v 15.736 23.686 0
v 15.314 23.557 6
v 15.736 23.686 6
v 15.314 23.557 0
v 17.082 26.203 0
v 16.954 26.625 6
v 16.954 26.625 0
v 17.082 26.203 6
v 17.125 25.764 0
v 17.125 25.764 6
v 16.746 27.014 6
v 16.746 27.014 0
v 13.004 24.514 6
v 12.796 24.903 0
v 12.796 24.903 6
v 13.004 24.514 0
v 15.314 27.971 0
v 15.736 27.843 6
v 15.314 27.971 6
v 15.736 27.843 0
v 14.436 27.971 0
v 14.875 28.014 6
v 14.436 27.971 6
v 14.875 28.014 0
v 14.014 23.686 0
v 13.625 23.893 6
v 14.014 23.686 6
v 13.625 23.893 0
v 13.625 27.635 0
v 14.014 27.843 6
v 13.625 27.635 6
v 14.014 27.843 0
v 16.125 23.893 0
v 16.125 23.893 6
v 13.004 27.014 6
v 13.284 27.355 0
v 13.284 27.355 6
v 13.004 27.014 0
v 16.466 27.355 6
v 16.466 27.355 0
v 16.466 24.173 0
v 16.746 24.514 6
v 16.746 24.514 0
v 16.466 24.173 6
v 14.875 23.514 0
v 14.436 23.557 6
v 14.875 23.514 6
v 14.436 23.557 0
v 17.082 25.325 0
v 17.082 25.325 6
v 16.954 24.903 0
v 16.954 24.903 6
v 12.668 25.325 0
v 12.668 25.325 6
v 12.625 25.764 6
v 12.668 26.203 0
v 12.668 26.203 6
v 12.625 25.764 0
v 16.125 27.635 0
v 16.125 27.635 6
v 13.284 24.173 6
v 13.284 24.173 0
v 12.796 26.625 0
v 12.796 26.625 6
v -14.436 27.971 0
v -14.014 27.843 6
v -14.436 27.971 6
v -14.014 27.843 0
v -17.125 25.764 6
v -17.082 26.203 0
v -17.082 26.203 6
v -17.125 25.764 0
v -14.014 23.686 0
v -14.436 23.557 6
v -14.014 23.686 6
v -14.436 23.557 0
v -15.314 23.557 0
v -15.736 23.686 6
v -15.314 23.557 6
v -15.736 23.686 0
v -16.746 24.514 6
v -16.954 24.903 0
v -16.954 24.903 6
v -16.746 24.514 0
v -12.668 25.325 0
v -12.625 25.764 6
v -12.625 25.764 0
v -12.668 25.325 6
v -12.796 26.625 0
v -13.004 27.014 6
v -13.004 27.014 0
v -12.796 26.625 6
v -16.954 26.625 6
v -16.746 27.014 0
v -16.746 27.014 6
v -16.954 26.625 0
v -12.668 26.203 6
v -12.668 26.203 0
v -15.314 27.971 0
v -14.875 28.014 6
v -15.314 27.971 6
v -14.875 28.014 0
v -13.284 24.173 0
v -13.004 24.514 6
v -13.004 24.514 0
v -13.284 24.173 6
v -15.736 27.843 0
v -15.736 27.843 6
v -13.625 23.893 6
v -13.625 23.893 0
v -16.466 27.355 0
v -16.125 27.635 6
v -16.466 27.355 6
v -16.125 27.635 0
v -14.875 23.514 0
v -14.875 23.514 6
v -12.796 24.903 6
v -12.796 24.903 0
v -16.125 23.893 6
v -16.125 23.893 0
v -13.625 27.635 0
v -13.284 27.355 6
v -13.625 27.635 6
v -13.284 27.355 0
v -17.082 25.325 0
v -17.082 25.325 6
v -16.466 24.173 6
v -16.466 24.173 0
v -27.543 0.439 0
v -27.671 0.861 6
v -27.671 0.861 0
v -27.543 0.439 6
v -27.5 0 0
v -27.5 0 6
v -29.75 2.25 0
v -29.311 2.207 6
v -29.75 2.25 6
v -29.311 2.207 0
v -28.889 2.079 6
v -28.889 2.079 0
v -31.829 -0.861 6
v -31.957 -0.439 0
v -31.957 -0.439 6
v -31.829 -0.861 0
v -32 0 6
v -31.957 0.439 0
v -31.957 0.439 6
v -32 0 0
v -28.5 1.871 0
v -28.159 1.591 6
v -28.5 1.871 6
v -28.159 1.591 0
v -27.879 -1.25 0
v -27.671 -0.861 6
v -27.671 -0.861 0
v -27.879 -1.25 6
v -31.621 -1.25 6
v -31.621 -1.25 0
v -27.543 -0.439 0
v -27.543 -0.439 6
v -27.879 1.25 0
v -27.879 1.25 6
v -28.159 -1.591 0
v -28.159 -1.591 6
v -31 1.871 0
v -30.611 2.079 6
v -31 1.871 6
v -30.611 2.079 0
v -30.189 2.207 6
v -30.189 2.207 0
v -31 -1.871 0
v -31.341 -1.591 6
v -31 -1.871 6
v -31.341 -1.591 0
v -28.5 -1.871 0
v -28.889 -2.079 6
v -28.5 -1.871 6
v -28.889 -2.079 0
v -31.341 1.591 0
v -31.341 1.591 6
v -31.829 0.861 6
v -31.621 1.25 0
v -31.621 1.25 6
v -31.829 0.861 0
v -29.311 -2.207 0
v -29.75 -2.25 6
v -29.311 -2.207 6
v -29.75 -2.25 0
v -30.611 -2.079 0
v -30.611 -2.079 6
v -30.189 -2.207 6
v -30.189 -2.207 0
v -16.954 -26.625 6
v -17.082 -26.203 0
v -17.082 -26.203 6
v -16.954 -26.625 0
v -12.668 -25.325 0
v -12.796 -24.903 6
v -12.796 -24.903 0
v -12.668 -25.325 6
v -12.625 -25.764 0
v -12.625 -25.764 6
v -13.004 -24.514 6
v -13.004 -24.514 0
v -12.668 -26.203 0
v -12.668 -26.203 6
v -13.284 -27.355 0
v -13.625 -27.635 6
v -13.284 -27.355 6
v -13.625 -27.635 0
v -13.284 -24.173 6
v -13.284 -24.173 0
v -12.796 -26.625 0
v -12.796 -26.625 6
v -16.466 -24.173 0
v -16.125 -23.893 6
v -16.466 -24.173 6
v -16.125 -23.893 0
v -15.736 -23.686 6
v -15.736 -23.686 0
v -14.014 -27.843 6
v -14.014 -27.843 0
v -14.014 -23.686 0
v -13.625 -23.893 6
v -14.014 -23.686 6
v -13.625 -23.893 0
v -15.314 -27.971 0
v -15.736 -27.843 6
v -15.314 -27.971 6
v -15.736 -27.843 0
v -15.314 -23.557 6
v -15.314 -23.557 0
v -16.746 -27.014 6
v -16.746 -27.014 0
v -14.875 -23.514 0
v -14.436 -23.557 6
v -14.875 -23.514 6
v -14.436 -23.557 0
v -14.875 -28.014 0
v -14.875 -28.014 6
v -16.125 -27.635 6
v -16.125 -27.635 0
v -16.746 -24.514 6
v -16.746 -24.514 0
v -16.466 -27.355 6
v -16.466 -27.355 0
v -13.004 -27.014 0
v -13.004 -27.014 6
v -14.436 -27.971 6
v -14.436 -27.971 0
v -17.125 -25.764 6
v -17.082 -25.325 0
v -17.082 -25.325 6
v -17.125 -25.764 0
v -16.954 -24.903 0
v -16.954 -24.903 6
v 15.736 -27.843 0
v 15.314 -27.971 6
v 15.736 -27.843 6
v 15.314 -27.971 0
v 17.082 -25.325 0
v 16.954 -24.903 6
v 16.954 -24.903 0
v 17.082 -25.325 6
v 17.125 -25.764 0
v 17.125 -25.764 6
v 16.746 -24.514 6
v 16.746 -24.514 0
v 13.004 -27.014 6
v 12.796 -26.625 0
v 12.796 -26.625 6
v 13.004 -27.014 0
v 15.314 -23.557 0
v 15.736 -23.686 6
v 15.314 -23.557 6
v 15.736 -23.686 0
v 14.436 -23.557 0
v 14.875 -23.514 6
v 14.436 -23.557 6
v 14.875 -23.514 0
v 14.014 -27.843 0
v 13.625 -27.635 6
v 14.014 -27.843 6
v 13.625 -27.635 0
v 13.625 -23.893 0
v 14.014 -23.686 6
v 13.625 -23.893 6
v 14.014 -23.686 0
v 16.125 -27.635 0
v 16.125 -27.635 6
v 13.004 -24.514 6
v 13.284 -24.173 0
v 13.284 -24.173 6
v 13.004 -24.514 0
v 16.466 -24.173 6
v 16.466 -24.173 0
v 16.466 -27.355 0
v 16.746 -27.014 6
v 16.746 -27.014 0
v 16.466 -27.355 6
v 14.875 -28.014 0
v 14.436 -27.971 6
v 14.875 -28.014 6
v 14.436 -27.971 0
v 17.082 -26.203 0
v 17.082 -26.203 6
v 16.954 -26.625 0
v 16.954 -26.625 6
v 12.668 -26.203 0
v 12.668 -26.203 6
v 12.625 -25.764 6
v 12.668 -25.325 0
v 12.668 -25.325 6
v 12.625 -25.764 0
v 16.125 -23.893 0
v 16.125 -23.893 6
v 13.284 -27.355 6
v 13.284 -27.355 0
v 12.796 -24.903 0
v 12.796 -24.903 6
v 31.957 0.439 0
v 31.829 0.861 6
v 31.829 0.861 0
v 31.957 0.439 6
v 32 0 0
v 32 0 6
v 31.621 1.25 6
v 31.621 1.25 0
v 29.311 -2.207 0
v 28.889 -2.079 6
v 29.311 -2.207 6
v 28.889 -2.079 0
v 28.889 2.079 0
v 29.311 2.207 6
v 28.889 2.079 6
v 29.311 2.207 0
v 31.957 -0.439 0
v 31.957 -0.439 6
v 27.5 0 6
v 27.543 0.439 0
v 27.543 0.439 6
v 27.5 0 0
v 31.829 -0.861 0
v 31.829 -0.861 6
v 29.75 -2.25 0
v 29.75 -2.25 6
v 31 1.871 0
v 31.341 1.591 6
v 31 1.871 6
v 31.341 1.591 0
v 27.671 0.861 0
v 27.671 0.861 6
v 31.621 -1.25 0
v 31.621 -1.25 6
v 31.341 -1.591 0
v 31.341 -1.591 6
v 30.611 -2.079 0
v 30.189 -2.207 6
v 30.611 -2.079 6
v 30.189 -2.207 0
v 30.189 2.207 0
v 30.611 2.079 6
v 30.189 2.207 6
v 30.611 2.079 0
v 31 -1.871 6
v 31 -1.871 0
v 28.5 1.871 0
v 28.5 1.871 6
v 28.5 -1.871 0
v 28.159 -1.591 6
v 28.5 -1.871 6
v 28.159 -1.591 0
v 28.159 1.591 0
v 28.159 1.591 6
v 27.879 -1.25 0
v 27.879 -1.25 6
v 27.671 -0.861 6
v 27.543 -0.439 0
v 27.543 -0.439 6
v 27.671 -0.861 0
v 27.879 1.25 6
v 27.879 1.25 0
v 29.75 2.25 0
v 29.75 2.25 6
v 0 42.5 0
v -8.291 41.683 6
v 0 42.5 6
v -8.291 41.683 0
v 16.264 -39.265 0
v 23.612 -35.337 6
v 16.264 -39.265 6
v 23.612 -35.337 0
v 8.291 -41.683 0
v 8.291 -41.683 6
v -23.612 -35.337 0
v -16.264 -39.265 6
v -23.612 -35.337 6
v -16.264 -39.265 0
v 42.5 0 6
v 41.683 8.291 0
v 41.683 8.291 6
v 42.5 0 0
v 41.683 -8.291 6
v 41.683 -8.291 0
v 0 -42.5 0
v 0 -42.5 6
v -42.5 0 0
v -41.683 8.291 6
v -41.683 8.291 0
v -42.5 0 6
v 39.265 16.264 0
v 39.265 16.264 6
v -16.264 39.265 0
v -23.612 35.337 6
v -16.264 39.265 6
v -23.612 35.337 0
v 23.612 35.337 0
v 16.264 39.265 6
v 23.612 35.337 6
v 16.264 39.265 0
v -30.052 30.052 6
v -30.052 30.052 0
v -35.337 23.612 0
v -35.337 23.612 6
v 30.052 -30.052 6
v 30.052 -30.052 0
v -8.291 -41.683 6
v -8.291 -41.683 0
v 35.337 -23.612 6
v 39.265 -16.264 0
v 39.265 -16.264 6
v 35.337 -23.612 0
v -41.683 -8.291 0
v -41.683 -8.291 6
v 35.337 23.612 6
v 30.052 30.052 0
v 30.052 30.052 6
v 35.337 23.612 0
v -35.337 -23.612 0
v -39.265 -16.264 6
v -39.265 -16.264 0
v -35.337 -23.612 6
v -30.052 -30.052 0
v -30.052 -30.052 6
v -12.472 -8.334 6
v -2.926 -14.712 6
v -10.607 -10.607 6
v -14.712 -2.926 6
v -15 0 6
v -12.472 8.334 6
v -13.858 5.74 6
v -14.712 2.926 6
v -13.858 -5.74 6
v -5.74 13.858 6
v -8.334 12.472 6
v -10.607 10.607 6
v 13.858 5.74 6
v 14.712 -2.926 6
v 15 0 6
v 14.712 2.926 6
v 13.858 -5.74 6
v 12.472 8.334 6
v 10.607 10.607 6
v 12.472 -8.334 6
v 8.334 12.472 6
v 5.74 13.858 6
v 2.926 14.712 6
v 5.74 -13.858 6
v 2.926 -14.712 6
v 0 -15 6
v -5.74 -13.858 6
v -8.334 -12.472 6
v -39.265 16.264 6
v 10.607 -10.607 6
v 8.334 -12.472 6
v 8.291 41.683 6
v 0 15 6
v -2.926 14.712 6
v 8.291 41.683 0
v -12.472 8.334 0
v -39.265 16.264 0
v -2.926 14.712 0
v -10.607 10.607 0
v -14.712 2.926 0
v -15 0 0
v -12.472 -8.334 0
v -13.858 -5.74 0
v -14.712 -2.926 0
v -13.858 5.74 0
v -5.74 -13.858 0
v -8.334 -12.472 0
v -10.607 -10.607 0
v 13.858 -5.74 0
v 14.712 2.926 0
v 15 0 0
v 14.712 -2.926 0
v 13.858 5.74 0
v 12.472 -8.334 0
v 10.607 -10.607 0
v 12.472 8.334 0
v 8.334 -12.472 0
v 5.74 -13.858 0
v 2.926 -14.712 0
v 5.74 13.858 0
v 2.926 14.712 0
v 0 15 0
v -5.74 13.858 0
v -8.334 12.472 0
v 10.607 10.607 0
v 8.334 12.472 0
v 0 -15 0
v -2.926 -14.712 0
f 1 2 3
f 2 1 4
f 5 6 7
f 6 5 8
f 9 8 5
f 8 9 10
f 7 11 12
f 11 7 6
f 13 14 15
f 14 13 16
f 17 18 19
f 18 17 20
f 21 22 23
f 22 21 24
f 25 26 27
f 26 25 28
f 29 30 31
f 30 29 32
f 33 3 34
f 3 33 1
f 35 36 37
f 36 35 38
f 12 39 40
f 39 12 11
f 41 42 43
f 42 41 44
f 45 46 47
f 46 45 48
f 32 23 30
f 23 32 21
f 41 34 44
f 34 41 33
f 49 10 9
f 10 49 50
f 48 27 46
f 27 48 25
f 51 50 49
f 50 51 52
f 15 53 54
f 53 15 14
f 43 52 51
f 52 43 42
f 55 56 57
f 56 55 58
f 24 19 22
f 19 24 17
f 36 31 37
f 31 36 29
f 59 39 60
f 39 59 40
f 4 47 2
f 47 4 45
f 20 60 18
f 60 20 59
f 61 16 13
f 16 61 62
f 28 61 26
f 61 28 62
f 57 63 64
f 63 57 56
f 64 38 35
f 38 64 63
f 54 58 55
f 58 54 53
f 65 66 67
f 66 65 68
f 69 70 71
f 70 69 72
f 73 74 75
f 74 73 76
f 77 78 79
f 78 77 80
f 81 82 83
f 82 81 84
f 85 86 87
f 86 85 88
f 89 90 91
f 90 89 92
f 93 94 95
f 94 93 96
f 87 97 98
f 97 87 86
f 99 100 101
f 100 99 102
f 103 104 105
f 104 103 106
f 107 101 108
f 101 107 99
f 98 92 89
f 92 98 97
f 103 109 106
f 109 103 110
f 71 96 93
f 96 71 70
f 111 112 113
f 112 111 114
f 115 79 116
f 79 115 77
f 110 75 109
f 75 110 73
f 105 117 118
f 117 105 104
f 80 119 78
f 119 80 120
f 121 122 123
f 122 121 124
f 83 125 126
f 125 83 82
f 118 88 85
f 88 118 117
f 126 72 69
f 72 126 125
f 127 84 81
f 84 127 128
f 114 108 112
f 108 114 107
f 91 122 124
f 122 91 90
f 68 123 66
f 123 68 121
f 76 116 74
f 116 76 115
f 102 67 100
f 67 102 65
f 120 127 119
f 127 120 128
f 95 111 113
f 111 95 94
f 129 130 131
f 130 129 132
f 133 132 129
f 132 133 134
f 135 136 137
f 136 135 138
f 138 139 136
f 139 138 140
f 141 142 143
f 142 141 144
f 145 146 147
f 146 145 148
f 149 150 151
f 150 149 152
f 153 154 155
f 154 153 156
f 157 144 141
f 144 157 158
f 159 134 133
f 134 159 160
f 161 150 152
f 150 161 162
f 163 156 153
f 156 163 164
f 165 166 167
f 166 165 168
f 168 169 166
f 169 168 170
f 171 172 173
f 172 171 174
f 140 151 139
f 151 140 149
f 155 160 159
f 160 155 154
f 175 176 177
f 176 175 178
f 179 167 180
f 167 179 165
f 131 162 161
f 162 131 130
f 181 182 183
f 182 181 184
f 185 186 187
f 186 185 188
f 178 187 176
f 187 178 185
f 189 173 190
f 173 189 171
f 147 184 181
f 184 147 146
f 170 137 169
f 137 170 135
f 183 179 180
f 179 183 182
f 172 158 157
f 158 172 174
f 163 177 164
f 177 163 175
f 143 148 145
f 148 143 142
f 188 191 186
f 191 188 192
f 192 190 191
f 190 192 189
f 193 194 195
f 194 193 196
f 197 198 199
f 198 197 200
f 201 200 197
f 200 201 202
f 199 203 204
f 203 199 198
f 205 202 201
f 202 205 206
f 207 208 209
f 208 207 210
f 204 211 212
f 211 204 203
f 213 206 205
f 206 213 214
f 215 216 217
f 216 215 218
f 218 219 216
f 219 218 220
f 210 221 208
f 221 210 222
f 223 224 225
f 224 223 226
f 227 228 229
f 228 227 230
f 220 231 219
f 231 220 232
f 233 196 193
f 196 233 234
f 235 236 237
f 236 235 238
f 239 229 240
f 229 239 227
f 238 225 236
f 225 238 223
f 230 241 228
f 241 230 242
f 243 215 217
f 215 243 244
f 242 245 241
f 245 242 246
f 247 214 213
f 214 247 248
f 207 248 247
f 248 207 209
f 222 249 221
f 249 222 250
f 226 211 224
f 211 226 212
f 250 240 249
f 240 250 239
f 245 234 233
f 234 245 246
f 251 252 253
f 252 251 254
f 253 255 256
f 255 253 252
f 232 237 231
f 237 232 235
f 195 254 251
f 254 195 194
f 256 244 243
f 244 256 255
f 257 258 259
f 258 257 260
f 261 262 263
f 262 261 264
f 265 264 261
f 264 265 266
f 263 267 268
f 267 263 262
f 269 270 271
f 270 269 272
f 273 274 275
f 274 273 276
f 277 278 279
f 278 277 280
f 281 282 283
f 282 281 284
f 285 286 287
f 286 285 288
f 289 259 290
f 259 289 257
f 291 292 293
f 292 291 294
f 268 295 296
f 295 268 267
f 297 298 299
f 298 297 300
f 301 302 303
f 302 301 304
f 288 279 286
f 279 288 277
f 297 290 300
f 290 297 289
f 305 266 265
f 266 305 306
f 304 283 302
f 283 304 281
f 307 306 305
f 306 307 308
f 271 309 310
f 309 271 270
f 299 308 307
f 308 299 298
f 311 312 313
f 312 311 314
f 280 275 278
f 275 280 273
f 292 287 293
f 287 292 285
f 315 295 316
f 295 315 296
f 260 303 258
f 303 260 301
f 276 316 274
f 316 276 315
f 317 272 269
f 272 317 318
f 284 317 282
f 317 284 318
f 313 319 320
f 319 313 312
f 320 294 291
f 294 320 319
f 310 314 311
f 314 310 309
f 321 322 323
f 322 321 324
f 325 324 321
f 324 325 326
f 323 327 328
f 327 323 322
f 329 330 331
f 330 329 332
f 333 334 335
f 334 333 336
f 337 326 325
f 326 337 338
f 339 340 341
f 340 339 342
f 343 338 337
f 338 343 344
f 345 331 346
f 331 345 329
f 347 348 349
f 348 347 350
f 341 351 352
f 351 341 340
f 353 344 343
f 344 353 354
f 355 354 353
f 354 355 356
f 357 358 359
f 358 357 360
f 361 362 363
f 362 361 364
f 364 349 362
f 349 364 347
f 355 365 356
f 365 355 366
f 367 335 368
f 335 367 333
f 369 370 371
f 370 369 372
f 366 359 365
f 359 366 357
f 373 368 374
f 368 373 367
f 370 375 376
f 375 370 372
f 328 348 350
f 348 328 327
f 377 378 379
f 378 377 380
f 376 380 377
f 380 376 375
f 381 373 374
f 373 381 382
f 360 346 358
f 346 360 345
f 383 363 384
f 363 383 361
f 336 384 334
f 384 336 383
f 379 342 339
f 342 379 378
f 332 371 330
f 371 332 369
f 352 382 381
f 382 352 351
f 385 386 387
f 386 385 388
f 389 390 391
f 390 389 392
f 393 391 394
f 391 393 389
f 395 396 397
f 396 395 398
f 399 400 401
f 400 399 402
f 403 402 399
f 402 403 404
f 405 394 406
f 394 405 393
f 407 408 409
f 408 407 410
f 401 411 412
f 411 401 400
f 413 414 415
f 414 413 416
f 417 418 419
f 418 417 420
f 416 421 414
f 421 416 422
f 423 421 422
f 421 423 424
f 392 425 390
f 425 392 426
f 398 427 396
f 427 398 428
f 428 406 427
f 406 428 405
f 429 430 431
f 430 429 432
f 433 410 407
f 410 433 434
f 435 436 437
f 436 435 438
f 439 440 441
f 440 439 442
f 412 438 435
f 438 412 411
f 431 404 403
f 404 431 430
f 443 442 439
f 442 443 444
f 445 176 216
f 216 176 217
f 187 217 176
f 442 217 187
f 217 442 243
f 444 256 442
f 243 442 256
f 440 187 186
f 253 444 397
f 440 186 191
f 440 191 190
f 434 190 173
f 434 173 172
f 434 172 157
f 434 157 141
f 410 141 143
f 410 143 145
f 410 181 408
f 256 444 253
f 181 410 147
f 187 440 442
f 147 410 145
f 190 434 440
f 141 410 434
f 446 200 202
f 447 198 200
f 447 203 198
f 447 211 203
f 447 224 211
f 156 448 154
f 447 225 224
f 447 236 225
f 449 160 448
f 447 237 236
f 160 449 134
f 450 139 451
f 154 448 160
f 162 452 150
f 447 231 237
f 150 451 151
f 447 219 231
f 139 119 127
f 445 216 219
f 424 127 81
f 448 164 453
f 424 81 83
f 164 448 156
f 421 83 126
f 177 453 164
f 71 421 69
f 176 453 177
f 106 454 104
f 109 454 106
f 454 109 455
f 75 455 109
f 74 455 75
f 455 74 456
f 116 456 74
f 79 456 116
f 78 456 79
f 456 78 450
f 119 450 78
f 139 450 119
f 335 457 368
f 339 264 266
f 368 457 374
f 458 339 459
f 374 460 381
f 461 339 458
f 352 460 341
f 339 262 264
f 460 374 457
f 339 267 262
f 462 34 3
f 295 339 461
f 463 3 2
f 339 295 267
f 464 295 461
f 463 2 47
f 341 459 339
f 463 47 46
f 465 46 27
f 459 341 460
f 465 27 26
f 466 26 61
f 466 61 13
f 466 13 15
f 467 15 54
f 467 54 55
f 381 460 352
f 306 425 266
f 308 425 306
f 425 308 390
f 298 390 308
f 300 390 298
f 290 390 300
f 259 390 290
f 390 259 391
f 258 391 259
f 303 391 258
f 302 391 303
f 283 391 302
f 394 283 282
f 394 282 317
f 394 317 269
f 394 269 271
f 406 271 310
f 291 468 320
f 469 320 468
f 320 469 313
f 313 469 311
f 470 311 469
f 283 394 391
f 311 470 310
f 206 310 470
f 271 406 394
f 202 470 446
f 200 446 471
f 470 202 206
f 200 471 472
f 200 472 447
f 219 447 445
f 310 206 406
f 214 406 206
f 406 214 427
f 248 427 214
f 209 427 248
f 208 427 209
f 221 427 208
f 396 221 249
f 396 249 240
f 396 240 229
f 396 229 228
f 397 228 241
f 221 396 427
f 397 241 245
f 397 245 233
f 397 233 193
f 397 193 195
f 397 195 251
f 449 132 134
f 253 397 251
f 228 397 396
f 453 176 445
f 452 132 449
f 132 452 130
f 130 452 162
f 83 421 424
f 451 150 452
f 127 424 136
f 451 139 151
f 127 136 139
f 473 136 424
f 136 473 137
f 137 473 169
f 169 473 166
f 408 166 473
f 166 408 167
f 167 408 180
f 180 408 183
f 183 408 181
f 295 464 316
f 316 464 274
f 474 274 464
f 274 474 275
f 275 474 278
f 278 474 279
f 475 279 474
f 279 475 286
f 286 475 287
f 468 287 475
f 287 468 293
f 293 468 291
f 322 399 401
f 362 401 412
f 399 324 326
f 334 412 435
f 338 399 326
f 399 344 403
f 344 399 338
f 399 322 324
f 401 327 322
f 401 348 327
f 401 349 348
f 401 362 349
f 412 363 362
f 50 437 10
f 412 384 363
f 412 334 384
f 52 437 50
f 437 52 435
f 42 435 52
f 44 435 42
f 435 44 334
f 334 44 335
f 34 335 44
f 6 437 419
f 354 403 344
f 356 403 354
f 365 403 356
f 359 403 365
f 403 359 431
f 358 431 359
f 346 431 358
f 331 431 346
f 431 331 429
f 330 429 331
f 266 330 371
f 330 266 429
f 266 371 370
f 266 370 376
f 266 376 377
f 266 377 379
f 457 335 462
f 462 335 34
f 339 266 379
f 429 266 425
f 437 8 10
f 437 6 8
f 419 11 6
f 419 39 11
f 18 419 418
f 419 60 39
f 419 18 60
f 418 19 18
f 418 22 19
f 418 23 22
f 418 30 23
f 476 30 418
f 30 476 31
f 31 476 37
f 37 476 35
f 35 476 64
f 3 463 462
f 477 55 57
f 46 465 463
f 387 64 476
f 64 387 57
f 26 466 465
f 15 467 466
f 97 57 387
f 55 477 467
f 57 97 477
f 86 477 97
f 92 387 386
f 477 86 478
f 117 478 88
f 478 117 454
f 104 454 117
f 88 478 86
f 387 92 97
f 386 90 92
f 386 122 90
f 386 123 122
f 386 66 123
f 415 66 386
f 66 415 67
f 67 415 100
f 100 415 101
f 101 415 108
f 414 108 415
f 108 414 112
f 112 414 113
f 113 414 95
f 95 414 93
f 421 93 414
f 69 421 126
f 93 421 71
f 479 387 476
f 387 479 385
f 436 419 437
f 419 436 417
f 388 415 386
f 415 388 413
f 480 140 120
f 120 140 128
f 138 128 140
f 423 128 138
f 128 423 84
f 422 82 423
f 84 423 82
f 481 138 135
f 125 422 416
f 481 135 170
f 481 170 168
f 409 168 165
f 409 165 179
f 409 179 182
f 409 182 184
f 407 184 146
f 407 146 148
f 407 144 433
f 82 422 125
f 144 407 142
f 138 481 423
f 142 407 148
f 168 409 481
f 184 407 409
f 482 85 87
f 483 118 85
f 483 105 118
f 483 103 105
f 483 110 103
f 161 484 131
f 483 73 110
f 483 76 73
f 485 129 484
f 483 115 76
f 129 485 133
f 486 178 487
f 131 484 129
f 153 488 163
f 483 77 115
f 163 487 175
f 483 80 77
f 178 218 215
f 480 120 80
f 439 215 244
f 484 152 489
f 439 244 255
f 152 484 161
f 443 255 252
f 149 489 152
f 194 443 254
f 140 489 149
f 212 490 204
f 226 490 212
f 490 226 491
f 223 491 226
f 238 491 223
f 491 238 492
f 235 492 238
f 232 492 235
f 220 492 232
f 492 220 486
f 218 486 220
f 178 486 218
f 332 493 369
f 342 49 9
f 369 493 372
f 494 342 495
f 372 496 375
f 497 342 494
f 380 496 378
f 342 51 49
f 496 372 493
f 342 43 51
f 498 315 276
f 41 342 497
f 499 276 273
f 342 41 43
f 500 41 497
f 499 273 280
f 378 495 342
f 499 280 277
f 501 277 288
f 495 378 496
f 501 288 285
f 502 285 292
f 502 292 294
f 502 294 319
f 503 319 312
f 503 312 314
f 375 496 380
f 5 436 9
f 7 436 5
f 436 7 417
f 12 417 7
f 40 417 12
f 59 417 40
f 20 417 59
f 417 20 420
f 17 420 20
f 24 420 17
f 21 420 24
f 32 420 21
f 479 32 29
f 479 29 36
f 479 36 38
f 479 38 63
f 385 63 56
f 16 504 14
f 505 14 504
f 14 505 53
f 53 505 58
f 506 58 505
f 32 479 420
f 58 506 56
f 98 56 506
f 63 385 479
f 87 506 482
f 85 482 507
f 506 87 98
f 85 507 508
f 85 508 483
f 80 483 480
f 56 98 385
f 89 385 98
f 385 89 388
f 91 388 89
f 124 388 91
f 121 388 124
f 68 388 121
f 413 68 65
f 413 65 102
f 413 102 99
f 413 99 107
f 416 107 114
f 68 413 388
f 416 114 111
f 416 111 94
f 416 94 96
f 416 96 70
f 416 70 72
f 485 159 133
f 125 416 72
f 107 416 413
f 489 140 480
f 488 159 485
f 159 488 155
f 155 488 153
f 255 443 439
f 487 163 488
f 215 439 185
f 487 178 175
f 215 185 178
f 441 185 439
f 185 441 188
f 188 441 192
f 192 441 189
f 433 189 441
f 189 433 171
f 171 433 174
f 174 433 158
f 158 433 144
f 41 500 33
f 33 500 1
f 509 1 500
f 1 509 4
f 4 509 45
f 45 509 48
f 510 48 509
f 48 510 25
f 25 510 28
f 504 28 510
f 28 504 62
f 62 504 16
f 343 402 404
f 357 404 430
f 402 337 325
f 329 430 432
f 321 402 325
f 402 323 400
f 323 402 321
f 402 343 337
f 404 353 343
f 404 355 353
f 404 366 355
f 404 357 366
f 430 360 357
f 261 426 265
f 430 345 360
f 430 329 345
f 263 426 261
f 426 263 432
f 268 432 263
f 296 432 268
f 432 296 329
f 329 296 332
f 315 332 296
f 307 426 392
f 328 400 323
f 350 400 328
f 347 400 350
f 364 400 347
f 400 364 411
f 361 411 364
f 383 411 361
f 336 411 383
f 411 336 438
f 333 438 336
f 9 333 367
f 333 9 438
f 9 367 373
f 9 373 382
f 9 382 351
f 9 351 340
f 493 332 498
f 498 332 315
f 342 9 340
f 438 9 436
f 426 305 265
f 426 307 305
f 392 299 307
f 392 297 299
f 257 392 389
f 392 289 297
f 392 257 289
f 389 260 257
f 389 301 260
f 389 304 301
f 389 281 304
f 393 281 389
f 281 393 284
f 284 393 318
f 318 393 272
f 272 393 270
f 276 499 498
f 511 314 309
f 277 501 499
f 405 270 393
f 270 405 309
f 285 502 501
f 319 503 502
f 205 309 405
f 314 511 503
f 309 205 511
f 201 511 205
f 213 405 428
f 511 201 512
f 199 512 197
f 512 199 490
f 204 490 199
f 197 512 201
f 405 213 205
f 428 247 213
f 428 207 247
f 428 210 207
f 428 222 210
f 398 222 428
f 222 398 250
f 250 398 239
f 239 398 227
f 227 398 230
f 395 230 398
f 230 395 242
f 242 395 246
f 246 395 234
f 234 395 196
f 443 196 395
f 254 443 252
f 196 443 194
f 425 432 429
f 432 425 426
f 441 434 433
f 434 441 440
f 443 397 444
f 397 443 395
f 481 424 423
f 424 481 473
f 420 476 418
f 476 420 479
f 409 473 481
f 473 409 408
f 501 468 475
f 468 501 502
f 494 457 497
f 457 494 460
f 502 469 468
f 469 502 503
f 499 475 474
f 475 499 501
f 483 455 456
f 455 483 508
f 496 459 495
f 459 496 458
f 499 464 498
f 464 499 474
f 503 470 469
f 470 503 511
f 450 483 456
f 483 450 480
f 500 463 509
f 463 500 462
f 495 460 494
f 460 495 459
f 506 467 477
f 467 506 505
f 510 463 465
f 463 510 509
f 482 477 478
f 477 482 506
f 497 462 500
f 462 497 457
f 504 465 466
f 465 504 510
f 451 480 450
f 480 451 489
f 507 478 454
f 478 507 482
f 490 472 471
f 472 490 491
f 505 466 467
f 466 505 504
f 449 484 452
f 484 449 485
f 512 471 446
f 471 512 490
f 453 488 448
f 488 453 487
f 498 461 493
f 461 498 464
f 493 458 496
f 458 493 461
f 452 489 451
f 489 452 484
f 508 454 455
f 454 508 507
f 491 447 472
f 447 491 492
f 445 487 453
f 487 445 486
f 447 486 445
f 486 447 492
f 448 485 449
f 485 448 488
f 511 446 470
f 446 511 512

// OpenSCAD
$fn = 32;

// ----------------------------------------------------------------------
// Flange Ø85 x 6
// 6 holes on a Ø59.5 bolt circle, bolted joints
// ----------------------------------------------------------------------

// --- parameters (mm) ---
flange_d = 85;   // outside diameter of the flange
thickness = 6;   // flange thickness
holes = 6;       // number of bolt holes
pcd = 59.5;      // bolt circle diameter
start_deg = 60;  // angle of the first hole, from +X
hole_d = 4.5;    // bolt hole diameter
bore_d = 30;     // central through bore
hub_d = 40;      // hub outside diameter
hub_h = 0;       // hub height above the flange face (0 = no hub)

// --- derived feature positions (mm) ---
height = thickness + hub_h;  // = 6   overall height of the part
pcd_r = pcd / 2;             // = 29.75   bolt circle radius
hole_step = 360 / holes;     // = 60   angular pitch
feature_centers = [
  [pcd_r * cos(start_deg + 0 * hole_step), pcd_r * sin(start_deg + 0 * hole_step)],
  [pcd_r * cos(start_deg + 1 * hole_step), pcd_r * sin(start_deg + 1 * hole_step)],
  [pcd_r * cos(start_deg + 2 * hole_step), pcd_r * sin(start_deg + 2 * hole_step)],
  [pcd_r * cos(start_deg + 3 * hole_step), pcd_r * sin(start_deg + 3 * hole_step)],
  [pcd_r * cos(start_deg + 4 * hole_step), pcd_r * sin(start_deg + 4 * hole_step)],
  [pcd_r * cos(start_deg + 5 * hole_step), pcd_r * sin(start_deg + 5 * hole_step)]
];   // bolt hole centres on the pitch circle

// flange disc, every hole and the bore cut straight through
difference() {
  union() {
    cylinder(d = flange_d, h = thickness);
  }
  translate([0, 0, -1]) cylinder(d = bore_d, h = height + 2);  // bore, through
  for (centre = feature_centers)
    translate([centre[0], centre[1], -1]) cylinder(d = hole_d, h = thickness + 2);
}
